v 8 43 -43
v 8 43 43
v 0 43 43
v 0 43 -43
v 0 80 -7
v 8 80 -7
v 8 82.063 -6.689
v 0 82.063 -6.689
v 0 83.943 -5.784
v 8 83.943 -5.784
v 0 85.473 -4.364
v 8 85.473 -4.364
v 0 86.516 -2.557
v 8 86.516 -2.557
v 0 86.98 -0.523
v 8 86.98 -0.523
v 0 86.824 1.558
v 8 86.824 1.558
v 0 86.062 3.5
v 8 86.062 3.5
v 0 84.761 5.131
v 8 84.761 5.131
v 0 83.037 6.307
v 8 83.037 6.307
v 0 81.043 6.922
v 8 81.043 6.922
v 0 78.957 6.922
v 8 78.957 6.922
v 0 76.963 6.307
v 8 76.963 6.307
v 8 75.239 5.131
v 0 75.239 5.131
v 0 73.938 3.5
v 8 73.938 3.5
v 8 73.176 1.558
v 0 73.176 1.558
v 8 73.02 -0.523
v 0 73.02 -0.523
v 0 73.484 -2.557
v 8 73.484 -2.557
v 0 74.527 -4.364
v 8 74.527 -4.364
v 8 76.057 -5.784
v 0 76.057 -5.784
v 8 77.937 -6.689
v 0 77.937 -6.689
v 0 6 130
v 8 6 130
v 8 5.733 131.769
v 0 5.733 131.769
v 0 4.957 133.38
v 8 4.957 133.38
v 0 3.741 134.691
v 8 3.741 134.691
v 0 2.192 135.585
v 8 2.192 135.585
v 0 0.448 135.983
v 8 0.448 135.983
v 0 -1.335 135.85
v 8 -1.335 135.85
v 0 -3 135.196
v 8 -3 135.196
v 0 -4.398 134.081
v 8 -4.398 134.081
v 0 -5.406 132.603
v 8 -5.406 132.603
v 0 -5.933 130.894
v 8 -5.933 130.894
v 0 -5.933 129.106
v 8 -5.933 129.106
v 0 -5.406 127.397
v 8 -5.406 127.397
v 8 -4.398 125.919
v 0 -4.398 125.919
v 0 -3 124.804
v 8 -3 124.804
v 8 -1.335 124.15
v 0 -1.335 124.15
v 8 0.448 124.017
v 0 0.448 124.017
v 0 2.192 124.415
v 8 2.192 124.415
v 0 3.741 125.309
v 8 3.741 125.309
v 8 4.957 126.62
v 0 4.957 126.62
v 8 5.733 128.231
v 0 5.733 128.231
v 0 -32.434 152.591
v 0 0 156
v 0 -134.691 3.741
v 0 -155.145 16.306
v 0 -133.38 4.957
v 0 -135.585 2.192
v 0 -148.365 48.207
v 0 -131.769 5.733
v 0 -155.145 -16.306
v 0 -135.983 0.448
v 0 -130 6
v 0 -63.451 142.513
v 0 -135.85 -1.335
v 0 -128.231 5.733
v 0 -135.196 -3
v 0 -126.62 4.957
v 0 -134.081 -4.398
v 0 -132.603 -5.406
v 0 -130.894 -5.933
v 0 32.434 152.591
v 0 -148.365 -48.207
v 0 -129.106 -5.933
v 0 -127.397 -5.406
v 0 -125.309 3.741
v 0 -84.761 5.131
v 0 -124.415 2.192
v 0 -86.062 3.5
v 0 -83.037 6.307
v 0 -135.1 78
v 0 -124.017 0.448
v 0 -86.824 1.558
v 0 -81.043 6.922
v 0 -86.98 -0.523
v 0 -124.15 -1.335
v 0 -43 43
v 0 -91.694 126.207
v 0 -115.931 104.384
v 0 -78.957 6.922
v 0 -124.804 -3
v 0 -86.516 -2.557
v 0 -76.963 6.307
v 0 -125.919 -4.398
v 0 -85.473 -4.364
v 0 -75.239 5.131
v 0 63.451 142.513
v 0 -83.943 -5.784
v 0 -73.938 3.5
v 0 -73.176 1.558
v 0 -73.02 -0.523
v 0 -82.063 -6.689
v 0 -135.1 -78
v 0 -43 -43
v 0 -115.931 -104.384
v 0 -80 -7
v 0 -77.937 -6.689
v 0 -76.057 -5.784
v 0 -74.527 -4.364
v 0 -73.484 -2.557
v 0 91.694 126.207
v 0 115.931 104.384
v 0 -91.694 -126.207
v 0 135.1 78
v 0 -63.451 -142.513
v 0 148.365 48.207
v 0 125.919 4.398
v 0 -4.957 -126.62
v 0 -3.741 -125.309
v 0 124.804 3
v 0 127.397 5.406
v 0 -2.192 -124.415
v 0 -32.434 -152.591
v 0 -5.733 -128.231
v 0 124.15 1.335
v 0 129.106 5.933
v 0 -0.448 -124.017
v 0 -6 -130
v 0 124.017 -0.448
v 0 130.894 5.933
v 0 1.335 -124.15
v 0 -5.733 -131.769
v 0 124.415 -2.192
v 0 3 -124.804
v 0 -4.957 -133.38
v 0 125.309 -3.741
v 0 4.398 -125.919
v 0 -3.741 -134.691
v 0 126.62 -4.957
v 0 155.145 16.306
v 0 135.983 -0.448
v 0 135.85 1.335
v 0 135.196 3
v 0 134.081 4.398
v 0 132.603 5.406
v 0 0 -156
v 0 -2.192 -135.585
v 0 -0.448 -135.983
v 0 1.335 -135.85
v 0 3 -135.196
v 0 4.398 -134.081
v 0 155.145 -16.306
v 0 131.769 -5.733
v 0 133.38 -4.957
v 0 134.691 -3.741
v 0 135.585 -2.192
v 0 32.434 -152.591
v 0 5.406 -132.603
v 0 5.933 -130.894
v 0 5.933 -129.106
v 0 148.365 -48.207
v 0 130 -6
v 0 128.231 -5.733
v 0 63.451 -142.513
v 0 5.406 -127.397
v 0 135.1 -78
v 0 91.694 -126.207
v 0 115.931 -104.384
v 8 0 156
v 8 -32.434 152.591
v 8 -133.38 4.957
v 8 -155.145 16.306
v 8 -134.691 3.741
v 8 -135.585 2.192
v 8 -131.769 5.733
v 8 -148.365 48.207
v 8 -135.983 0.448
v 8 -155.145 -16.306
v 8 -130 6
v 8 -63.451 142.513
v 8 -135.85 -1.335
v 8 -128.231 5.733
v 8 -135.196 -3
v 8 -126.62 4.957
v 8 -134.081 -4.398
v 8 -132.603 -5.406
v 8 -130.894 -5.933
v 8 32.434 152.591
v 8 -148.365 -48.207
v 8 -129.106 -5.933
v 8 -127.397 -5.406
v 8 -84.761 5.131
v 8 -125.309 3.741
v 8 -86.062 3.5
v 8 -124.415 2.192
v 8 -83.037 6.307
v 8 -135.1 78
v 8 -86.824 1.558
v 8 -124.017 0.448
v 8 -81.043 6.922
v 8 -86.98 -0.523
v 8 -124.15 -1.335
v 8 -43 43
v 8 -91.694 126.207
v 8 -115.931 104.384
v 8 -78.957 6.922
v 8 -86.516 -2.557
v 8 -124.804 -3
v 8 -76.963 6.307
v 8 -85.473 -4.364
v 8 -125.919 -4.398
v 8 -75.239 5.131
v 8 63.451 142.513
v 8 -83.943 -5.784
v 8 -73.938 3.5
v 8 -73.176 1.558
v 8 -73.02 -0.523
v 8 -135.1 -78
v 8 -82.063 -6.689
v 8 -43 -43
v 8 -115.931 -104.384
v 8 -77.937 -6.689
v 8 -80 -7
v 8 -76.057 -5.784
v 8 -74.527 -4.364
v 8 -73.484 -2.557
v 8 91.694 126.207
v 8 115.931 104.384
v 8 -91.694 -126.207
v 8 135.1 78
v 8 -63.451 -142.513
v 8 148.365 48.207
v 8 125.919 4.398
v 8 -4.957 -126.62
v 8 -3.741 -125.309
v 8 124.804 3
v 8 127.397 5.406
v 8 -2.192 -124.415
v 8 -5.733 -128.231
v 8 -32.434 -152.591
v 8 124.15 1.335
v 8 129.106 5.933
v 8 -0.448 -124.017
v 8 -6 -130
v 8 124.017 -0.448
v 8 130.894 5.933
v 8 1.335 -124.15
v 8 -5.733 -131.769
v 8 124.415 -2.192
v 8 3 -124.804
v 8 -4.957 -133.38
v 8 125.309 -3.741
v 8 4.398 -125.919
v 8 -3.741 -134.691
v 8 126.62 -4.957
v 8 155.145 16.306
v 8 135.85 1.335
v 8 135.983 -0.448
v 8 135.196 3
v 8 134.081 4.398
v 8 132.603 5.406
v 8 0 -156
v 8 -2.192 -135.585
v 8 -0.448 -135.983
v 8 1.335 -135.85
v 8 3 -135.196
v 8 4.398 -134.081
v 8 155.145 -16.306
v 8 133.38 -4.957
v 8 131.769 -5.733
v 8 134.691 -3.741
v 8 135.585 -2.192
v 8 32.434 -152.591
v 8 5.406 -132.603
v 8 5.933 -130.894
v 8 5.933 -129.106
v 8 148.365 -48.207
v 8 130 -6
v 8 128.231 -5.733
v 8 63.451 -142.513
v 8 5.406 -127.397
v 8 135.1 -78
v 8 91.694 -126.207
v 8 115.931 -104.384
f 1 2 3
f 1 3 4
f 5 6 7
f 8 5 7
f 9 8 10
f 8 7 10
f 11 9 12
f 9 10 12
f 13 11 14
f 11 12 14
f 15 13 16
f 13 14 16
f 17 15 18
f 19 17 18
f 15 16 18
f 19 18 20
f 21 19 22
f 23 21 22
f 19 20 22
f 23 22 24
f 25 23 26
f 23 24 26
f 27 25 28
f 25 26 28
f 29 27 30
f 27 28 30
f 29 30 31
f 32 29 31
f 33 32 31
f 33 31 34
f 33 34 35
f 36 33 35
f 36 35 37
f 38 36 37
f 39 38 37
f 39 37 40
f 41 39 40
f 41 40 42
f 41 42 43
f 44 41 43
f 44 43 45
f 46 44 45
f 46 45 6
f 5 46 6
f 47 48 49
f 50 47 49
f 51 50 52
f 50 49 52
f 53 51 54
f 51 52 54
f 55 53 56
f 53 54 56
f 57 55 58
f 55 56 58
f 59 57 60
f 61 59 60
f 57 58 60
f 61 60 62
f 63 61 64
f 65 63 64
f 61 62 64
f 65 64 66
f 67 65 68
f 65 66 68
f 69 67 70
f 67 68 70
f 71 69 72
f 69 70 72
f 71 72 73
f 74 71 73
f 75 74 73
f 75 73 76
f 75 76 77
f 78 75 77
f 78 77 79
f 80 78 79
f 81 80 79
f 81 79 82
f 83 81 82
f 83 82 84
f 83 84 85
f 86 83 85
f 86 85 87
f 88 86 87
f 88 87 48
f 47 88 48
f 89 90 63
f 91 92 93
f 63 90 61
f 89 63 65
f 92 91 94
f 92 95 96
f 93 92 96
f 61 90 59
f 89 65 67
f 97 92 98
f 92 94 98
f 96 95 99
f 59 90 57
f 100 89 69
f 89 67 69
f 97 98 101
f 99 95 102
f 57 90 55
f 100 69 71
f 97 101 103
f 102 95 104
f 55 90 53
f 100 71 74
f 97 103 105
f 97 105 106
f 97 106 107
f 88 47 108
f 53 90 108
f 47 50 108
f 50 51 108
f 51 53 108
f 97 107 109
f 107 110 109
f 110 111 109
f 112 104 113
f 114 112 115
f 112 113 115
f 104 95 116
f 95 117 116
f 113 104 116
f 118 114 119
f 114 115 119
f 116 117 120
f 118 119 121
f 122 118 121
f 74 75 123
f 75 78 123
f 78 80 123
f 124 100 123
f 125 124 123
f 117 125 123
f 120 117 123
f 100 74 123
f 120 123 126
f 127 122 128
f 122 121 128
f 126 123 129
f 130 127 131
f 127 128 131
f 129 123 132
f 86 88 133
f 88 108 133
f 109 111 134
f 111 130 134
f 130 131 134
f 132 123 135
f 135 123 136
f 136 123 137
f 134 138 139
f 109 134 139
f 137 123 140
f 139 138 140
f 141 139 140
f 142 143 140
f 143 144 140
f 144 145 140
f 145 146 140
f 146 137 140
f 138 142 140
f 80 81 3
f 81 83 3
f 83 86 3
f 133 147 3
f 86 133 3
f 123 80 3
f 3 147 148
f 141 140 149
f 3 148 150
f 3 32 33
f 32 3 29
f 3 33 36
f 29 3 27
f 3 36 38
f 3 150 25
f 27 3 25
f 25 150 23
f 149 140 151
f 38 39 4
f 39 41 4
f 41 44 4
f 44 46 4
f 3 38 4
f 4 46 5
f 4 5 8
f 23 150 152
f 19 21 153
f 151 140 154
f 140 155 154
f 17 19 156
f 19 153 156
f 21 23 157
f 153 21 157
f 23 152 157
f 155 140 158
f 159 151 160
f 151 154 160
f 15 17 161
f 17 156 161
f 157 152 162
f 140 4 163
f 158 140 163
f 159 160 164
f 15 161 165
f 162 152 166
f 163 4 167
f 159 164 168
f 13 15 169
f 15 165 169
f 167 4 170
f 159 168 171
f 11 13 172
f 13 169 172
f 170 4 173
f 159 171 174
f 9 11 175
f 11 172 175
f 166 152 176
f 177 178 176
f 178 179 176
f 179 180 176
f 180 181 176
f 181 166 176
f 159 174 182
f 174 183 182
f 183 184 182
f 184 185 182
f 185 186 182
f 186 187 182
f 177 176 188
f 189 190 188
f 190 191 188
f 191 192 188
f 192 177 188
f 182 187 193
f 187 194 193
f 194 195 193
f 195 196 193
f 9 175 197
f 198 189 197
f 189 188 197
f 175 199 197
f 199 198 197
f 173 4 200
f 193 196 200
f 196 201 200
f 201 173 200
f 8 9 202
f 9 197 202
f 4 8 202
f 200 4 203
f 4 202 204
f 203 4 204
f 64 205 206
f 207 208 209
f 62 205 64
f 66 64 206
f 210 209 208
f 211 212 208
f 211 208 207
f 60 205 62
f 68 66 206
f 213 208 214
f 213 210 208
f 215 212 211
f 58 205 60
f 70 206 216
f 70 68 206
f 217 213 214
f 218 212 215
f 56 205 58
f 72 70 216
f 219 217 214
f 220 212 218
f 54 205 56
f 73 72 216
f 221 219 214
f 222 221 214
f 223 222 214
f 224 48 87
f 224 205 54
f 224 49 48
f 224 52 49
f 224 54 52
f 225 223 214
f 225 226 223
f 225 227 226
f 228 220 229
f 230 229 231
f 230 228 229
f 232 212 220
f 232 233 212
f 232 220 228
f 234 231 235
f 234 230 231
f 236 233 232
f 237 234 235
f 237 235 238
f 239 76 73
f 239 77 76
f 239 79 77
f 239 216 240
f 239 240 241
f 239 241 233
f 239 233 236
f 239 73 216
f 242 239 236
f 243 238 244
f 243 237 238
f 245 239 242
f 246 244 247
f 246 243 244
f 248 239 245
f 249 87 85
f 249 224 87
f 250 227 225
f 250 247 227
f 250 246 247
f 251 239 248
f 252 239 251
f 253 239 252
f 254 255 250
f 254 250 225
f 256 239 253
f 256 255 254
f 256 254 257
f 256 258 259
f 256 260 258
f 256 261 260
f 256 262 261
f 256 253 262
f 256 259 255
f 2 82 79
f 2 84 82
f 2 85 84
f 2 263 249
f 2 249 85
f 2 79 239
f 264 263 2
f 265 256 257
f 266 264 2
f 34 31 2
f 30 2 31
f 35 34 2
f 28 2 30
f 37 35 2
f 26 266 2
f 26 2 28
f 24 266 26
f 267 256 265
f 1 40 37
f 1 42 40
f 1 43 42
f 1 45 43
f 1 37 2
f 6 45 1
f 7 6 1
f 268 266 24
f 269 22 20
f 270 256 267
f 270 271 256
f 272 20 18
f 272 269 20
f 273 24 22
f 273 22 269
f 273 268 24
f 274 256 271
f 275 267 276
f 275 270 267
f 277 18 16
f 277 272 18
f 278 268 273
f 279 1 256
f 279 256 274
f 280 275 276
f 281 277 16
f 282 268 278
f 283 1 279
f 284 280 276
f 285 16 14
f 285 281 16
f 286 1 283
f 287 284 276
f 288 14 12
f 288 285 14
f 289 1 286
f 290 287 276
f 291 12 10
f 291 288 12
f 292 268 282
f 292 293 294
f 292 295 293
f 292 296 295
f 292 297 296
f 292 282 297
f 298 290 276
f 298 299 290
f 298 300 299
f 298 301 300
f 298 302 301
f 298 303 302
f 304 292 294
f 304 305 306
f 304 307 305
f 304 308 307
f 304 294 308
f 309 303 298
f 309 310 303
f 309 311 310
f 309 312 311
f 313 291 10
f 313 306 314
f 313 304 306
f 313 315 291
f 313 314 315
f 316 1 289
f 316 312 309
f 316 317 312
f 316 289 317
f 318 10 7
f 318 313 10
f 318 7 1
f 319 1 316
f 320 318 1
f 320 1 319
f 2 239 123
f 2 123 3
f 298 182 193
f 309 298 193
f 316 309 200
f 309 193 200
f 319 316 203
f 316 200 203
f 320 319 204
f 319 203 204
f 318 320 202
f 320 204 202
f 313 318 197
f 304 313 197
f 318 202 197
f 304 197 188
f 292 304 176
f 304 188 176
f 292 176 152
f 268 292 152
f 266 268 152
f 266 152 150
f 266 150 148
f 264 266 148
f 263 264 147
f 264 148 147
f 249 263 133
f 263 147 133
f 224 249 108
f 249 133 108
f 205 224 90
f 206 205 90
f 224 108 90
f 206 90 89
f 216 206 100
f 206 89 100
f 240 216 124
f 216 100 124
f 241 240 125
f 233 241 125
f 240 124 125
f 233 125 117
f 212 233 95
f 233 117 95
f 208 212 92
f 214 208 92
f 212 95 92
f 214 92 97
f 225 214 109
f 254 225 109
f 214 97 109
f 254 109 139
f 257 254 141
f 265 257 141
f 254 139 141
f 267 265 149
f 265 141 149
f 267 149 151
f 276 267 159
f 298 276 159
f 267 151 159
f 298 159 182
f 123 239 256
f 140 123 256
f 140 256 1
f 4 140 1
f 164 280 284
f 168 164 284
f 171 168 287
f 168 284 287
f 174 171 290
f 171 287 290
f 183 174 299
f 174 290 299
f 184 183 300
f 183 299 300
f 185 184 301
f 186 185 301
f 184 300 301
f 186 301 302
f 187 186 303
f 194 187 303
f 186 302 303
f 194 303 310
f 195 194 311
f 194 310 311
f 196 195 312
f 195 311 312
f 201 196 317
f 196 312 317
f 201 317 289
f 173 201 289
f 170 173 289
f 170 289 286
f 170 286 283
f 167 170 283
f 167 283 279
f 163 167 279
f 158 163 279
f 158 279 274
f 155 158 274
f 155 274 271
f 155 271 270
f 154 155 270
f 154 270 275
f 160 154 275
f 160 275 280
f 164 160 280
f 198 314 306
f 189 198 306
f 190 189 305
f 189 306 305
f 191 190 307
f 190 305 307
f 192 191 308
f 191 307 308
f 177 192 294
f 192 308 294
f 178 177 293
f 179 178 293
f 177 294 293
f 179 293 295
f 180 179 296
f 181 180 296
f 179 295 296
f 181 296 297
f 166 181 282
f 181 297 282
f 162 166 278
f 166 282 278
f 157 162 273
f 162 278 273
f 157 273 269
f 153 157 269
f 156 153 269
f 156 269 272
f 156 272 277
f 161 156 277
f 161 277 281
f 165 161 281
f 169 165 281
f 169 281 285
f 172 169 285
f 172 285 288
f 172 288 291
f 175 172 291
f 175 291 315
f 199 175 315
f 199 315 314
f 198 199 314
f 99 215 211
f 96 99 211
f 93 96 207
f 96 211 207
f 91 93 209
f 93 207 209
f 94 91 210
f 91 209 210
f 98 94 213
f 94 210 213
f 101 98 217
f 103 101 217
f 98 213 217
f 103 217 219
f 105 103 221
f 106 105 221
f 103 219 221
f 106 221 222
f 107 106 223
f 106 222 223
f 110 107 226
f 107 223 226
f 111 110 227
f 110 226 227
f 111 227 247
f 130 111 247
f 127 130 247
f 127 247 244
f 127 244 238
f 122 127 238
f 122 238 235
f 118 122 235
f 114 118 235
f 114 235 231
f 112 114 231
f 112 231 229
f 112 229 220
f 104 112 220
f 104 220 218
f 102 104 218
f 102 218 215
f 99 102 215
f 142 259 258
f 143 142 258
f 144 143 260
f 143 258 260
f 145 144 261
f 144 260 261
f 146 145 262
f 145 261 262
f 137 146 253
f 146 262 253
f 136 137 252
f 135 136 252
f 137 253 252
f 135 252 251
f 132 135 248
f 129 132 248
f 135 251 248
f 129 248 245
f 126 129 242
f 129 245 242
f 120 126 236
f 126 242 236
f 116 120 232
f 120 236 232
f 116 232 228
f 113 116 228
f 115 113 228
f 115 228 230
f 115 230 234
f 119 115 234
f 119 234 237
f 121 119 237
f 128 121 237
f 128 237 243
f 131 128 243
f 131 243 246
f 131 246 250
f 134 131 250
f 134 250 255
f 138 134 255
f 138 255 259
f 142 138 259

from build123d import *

# Parameters (mm, degrees)
SKETCH_1_R               = 156
EXTRUDE_1_DEPTH          = 8
SKETCH_5_R               = 6
CUT_EXTRUDE_4_DEPTH      = 10
PATTERN_CIRCULAR_3_COUNT = 4
SKETCH_6_W               = 86
SKETCH_6_H               = 86
CUT_EXTRUDE_5_DEPTH      = 10
SKETCH_7_R               = 7
CUT_EXTRUDE_6_DEPTH      = 10


with BuildPart() as part:
    # 草图1 → 凸台-拉伸1 (new body)
    with BuildSketch(Plane(origin=(0, 0, 0), x_dir=(0, 0, -1), z_dir=(1, 0, 0))):
        Circle(SKETCH_1_R)
    extrude(amount=EXTRUDE_1_DEPTH)

    # 草图5 → 切除-拉伸4 (cut)
    with BuildSketch(Plane(origin=(8, 0, 0), x_dir=(0, 0, -1), z_dir=(1, 0, 0))):
        with Locations((0, 130)):
            Circle(SKETCH_5_R)
    cut_extrude_4 = extrude(amount=-CUT_EXTRUDE_4_DEPTH, mode=Mode.SUBTRACT)

    # 阵列(圆周)3: 切除-拉伸4 ×4 about axis
    pattern_circular_3_axis = Axis((0, 0, 0), (1, 0, 0))
    for i in range(1, PATTERN_CIRCULAR_3_COUNT):
        add(cut_extrude_4.rotate(pattern_circular_3_axis, i * 360 / PATTERN_CIRCULAR_3_COUNT), mode=Mode.SUBTRACT)

    # 草图6 → 切除-拉伸5 (cut)
    with BuildSketch(Plane(origin=(8, 0, 0), x_dir=(0, 0, -1), z_dir=(1, 0, 0))):
        Rectangle(SKETCH_6_W, SKETCH_6_H)
    extrude(amount=-CUT_EXTRUDE_5_DEPTH, mode=Mode.SUBTRACT)

    # 草图7 → 切除-拉伸6 (cut)
    with BuildSketch(Plane(origin=(8, 0, 0), x_dir=(0, 0, -1), z_dir=(1, 0, 0))):
        with Locations((0, 80)):
            Circle(SKETCH_7_R)
        with Locations((0, -80)):
            Circle(SKETCH_7_R)
    extrude(amount=-CUT_EXTRUDE_6_DEPTH, mode=Mode.SUBTRACT)


solid = part.part
